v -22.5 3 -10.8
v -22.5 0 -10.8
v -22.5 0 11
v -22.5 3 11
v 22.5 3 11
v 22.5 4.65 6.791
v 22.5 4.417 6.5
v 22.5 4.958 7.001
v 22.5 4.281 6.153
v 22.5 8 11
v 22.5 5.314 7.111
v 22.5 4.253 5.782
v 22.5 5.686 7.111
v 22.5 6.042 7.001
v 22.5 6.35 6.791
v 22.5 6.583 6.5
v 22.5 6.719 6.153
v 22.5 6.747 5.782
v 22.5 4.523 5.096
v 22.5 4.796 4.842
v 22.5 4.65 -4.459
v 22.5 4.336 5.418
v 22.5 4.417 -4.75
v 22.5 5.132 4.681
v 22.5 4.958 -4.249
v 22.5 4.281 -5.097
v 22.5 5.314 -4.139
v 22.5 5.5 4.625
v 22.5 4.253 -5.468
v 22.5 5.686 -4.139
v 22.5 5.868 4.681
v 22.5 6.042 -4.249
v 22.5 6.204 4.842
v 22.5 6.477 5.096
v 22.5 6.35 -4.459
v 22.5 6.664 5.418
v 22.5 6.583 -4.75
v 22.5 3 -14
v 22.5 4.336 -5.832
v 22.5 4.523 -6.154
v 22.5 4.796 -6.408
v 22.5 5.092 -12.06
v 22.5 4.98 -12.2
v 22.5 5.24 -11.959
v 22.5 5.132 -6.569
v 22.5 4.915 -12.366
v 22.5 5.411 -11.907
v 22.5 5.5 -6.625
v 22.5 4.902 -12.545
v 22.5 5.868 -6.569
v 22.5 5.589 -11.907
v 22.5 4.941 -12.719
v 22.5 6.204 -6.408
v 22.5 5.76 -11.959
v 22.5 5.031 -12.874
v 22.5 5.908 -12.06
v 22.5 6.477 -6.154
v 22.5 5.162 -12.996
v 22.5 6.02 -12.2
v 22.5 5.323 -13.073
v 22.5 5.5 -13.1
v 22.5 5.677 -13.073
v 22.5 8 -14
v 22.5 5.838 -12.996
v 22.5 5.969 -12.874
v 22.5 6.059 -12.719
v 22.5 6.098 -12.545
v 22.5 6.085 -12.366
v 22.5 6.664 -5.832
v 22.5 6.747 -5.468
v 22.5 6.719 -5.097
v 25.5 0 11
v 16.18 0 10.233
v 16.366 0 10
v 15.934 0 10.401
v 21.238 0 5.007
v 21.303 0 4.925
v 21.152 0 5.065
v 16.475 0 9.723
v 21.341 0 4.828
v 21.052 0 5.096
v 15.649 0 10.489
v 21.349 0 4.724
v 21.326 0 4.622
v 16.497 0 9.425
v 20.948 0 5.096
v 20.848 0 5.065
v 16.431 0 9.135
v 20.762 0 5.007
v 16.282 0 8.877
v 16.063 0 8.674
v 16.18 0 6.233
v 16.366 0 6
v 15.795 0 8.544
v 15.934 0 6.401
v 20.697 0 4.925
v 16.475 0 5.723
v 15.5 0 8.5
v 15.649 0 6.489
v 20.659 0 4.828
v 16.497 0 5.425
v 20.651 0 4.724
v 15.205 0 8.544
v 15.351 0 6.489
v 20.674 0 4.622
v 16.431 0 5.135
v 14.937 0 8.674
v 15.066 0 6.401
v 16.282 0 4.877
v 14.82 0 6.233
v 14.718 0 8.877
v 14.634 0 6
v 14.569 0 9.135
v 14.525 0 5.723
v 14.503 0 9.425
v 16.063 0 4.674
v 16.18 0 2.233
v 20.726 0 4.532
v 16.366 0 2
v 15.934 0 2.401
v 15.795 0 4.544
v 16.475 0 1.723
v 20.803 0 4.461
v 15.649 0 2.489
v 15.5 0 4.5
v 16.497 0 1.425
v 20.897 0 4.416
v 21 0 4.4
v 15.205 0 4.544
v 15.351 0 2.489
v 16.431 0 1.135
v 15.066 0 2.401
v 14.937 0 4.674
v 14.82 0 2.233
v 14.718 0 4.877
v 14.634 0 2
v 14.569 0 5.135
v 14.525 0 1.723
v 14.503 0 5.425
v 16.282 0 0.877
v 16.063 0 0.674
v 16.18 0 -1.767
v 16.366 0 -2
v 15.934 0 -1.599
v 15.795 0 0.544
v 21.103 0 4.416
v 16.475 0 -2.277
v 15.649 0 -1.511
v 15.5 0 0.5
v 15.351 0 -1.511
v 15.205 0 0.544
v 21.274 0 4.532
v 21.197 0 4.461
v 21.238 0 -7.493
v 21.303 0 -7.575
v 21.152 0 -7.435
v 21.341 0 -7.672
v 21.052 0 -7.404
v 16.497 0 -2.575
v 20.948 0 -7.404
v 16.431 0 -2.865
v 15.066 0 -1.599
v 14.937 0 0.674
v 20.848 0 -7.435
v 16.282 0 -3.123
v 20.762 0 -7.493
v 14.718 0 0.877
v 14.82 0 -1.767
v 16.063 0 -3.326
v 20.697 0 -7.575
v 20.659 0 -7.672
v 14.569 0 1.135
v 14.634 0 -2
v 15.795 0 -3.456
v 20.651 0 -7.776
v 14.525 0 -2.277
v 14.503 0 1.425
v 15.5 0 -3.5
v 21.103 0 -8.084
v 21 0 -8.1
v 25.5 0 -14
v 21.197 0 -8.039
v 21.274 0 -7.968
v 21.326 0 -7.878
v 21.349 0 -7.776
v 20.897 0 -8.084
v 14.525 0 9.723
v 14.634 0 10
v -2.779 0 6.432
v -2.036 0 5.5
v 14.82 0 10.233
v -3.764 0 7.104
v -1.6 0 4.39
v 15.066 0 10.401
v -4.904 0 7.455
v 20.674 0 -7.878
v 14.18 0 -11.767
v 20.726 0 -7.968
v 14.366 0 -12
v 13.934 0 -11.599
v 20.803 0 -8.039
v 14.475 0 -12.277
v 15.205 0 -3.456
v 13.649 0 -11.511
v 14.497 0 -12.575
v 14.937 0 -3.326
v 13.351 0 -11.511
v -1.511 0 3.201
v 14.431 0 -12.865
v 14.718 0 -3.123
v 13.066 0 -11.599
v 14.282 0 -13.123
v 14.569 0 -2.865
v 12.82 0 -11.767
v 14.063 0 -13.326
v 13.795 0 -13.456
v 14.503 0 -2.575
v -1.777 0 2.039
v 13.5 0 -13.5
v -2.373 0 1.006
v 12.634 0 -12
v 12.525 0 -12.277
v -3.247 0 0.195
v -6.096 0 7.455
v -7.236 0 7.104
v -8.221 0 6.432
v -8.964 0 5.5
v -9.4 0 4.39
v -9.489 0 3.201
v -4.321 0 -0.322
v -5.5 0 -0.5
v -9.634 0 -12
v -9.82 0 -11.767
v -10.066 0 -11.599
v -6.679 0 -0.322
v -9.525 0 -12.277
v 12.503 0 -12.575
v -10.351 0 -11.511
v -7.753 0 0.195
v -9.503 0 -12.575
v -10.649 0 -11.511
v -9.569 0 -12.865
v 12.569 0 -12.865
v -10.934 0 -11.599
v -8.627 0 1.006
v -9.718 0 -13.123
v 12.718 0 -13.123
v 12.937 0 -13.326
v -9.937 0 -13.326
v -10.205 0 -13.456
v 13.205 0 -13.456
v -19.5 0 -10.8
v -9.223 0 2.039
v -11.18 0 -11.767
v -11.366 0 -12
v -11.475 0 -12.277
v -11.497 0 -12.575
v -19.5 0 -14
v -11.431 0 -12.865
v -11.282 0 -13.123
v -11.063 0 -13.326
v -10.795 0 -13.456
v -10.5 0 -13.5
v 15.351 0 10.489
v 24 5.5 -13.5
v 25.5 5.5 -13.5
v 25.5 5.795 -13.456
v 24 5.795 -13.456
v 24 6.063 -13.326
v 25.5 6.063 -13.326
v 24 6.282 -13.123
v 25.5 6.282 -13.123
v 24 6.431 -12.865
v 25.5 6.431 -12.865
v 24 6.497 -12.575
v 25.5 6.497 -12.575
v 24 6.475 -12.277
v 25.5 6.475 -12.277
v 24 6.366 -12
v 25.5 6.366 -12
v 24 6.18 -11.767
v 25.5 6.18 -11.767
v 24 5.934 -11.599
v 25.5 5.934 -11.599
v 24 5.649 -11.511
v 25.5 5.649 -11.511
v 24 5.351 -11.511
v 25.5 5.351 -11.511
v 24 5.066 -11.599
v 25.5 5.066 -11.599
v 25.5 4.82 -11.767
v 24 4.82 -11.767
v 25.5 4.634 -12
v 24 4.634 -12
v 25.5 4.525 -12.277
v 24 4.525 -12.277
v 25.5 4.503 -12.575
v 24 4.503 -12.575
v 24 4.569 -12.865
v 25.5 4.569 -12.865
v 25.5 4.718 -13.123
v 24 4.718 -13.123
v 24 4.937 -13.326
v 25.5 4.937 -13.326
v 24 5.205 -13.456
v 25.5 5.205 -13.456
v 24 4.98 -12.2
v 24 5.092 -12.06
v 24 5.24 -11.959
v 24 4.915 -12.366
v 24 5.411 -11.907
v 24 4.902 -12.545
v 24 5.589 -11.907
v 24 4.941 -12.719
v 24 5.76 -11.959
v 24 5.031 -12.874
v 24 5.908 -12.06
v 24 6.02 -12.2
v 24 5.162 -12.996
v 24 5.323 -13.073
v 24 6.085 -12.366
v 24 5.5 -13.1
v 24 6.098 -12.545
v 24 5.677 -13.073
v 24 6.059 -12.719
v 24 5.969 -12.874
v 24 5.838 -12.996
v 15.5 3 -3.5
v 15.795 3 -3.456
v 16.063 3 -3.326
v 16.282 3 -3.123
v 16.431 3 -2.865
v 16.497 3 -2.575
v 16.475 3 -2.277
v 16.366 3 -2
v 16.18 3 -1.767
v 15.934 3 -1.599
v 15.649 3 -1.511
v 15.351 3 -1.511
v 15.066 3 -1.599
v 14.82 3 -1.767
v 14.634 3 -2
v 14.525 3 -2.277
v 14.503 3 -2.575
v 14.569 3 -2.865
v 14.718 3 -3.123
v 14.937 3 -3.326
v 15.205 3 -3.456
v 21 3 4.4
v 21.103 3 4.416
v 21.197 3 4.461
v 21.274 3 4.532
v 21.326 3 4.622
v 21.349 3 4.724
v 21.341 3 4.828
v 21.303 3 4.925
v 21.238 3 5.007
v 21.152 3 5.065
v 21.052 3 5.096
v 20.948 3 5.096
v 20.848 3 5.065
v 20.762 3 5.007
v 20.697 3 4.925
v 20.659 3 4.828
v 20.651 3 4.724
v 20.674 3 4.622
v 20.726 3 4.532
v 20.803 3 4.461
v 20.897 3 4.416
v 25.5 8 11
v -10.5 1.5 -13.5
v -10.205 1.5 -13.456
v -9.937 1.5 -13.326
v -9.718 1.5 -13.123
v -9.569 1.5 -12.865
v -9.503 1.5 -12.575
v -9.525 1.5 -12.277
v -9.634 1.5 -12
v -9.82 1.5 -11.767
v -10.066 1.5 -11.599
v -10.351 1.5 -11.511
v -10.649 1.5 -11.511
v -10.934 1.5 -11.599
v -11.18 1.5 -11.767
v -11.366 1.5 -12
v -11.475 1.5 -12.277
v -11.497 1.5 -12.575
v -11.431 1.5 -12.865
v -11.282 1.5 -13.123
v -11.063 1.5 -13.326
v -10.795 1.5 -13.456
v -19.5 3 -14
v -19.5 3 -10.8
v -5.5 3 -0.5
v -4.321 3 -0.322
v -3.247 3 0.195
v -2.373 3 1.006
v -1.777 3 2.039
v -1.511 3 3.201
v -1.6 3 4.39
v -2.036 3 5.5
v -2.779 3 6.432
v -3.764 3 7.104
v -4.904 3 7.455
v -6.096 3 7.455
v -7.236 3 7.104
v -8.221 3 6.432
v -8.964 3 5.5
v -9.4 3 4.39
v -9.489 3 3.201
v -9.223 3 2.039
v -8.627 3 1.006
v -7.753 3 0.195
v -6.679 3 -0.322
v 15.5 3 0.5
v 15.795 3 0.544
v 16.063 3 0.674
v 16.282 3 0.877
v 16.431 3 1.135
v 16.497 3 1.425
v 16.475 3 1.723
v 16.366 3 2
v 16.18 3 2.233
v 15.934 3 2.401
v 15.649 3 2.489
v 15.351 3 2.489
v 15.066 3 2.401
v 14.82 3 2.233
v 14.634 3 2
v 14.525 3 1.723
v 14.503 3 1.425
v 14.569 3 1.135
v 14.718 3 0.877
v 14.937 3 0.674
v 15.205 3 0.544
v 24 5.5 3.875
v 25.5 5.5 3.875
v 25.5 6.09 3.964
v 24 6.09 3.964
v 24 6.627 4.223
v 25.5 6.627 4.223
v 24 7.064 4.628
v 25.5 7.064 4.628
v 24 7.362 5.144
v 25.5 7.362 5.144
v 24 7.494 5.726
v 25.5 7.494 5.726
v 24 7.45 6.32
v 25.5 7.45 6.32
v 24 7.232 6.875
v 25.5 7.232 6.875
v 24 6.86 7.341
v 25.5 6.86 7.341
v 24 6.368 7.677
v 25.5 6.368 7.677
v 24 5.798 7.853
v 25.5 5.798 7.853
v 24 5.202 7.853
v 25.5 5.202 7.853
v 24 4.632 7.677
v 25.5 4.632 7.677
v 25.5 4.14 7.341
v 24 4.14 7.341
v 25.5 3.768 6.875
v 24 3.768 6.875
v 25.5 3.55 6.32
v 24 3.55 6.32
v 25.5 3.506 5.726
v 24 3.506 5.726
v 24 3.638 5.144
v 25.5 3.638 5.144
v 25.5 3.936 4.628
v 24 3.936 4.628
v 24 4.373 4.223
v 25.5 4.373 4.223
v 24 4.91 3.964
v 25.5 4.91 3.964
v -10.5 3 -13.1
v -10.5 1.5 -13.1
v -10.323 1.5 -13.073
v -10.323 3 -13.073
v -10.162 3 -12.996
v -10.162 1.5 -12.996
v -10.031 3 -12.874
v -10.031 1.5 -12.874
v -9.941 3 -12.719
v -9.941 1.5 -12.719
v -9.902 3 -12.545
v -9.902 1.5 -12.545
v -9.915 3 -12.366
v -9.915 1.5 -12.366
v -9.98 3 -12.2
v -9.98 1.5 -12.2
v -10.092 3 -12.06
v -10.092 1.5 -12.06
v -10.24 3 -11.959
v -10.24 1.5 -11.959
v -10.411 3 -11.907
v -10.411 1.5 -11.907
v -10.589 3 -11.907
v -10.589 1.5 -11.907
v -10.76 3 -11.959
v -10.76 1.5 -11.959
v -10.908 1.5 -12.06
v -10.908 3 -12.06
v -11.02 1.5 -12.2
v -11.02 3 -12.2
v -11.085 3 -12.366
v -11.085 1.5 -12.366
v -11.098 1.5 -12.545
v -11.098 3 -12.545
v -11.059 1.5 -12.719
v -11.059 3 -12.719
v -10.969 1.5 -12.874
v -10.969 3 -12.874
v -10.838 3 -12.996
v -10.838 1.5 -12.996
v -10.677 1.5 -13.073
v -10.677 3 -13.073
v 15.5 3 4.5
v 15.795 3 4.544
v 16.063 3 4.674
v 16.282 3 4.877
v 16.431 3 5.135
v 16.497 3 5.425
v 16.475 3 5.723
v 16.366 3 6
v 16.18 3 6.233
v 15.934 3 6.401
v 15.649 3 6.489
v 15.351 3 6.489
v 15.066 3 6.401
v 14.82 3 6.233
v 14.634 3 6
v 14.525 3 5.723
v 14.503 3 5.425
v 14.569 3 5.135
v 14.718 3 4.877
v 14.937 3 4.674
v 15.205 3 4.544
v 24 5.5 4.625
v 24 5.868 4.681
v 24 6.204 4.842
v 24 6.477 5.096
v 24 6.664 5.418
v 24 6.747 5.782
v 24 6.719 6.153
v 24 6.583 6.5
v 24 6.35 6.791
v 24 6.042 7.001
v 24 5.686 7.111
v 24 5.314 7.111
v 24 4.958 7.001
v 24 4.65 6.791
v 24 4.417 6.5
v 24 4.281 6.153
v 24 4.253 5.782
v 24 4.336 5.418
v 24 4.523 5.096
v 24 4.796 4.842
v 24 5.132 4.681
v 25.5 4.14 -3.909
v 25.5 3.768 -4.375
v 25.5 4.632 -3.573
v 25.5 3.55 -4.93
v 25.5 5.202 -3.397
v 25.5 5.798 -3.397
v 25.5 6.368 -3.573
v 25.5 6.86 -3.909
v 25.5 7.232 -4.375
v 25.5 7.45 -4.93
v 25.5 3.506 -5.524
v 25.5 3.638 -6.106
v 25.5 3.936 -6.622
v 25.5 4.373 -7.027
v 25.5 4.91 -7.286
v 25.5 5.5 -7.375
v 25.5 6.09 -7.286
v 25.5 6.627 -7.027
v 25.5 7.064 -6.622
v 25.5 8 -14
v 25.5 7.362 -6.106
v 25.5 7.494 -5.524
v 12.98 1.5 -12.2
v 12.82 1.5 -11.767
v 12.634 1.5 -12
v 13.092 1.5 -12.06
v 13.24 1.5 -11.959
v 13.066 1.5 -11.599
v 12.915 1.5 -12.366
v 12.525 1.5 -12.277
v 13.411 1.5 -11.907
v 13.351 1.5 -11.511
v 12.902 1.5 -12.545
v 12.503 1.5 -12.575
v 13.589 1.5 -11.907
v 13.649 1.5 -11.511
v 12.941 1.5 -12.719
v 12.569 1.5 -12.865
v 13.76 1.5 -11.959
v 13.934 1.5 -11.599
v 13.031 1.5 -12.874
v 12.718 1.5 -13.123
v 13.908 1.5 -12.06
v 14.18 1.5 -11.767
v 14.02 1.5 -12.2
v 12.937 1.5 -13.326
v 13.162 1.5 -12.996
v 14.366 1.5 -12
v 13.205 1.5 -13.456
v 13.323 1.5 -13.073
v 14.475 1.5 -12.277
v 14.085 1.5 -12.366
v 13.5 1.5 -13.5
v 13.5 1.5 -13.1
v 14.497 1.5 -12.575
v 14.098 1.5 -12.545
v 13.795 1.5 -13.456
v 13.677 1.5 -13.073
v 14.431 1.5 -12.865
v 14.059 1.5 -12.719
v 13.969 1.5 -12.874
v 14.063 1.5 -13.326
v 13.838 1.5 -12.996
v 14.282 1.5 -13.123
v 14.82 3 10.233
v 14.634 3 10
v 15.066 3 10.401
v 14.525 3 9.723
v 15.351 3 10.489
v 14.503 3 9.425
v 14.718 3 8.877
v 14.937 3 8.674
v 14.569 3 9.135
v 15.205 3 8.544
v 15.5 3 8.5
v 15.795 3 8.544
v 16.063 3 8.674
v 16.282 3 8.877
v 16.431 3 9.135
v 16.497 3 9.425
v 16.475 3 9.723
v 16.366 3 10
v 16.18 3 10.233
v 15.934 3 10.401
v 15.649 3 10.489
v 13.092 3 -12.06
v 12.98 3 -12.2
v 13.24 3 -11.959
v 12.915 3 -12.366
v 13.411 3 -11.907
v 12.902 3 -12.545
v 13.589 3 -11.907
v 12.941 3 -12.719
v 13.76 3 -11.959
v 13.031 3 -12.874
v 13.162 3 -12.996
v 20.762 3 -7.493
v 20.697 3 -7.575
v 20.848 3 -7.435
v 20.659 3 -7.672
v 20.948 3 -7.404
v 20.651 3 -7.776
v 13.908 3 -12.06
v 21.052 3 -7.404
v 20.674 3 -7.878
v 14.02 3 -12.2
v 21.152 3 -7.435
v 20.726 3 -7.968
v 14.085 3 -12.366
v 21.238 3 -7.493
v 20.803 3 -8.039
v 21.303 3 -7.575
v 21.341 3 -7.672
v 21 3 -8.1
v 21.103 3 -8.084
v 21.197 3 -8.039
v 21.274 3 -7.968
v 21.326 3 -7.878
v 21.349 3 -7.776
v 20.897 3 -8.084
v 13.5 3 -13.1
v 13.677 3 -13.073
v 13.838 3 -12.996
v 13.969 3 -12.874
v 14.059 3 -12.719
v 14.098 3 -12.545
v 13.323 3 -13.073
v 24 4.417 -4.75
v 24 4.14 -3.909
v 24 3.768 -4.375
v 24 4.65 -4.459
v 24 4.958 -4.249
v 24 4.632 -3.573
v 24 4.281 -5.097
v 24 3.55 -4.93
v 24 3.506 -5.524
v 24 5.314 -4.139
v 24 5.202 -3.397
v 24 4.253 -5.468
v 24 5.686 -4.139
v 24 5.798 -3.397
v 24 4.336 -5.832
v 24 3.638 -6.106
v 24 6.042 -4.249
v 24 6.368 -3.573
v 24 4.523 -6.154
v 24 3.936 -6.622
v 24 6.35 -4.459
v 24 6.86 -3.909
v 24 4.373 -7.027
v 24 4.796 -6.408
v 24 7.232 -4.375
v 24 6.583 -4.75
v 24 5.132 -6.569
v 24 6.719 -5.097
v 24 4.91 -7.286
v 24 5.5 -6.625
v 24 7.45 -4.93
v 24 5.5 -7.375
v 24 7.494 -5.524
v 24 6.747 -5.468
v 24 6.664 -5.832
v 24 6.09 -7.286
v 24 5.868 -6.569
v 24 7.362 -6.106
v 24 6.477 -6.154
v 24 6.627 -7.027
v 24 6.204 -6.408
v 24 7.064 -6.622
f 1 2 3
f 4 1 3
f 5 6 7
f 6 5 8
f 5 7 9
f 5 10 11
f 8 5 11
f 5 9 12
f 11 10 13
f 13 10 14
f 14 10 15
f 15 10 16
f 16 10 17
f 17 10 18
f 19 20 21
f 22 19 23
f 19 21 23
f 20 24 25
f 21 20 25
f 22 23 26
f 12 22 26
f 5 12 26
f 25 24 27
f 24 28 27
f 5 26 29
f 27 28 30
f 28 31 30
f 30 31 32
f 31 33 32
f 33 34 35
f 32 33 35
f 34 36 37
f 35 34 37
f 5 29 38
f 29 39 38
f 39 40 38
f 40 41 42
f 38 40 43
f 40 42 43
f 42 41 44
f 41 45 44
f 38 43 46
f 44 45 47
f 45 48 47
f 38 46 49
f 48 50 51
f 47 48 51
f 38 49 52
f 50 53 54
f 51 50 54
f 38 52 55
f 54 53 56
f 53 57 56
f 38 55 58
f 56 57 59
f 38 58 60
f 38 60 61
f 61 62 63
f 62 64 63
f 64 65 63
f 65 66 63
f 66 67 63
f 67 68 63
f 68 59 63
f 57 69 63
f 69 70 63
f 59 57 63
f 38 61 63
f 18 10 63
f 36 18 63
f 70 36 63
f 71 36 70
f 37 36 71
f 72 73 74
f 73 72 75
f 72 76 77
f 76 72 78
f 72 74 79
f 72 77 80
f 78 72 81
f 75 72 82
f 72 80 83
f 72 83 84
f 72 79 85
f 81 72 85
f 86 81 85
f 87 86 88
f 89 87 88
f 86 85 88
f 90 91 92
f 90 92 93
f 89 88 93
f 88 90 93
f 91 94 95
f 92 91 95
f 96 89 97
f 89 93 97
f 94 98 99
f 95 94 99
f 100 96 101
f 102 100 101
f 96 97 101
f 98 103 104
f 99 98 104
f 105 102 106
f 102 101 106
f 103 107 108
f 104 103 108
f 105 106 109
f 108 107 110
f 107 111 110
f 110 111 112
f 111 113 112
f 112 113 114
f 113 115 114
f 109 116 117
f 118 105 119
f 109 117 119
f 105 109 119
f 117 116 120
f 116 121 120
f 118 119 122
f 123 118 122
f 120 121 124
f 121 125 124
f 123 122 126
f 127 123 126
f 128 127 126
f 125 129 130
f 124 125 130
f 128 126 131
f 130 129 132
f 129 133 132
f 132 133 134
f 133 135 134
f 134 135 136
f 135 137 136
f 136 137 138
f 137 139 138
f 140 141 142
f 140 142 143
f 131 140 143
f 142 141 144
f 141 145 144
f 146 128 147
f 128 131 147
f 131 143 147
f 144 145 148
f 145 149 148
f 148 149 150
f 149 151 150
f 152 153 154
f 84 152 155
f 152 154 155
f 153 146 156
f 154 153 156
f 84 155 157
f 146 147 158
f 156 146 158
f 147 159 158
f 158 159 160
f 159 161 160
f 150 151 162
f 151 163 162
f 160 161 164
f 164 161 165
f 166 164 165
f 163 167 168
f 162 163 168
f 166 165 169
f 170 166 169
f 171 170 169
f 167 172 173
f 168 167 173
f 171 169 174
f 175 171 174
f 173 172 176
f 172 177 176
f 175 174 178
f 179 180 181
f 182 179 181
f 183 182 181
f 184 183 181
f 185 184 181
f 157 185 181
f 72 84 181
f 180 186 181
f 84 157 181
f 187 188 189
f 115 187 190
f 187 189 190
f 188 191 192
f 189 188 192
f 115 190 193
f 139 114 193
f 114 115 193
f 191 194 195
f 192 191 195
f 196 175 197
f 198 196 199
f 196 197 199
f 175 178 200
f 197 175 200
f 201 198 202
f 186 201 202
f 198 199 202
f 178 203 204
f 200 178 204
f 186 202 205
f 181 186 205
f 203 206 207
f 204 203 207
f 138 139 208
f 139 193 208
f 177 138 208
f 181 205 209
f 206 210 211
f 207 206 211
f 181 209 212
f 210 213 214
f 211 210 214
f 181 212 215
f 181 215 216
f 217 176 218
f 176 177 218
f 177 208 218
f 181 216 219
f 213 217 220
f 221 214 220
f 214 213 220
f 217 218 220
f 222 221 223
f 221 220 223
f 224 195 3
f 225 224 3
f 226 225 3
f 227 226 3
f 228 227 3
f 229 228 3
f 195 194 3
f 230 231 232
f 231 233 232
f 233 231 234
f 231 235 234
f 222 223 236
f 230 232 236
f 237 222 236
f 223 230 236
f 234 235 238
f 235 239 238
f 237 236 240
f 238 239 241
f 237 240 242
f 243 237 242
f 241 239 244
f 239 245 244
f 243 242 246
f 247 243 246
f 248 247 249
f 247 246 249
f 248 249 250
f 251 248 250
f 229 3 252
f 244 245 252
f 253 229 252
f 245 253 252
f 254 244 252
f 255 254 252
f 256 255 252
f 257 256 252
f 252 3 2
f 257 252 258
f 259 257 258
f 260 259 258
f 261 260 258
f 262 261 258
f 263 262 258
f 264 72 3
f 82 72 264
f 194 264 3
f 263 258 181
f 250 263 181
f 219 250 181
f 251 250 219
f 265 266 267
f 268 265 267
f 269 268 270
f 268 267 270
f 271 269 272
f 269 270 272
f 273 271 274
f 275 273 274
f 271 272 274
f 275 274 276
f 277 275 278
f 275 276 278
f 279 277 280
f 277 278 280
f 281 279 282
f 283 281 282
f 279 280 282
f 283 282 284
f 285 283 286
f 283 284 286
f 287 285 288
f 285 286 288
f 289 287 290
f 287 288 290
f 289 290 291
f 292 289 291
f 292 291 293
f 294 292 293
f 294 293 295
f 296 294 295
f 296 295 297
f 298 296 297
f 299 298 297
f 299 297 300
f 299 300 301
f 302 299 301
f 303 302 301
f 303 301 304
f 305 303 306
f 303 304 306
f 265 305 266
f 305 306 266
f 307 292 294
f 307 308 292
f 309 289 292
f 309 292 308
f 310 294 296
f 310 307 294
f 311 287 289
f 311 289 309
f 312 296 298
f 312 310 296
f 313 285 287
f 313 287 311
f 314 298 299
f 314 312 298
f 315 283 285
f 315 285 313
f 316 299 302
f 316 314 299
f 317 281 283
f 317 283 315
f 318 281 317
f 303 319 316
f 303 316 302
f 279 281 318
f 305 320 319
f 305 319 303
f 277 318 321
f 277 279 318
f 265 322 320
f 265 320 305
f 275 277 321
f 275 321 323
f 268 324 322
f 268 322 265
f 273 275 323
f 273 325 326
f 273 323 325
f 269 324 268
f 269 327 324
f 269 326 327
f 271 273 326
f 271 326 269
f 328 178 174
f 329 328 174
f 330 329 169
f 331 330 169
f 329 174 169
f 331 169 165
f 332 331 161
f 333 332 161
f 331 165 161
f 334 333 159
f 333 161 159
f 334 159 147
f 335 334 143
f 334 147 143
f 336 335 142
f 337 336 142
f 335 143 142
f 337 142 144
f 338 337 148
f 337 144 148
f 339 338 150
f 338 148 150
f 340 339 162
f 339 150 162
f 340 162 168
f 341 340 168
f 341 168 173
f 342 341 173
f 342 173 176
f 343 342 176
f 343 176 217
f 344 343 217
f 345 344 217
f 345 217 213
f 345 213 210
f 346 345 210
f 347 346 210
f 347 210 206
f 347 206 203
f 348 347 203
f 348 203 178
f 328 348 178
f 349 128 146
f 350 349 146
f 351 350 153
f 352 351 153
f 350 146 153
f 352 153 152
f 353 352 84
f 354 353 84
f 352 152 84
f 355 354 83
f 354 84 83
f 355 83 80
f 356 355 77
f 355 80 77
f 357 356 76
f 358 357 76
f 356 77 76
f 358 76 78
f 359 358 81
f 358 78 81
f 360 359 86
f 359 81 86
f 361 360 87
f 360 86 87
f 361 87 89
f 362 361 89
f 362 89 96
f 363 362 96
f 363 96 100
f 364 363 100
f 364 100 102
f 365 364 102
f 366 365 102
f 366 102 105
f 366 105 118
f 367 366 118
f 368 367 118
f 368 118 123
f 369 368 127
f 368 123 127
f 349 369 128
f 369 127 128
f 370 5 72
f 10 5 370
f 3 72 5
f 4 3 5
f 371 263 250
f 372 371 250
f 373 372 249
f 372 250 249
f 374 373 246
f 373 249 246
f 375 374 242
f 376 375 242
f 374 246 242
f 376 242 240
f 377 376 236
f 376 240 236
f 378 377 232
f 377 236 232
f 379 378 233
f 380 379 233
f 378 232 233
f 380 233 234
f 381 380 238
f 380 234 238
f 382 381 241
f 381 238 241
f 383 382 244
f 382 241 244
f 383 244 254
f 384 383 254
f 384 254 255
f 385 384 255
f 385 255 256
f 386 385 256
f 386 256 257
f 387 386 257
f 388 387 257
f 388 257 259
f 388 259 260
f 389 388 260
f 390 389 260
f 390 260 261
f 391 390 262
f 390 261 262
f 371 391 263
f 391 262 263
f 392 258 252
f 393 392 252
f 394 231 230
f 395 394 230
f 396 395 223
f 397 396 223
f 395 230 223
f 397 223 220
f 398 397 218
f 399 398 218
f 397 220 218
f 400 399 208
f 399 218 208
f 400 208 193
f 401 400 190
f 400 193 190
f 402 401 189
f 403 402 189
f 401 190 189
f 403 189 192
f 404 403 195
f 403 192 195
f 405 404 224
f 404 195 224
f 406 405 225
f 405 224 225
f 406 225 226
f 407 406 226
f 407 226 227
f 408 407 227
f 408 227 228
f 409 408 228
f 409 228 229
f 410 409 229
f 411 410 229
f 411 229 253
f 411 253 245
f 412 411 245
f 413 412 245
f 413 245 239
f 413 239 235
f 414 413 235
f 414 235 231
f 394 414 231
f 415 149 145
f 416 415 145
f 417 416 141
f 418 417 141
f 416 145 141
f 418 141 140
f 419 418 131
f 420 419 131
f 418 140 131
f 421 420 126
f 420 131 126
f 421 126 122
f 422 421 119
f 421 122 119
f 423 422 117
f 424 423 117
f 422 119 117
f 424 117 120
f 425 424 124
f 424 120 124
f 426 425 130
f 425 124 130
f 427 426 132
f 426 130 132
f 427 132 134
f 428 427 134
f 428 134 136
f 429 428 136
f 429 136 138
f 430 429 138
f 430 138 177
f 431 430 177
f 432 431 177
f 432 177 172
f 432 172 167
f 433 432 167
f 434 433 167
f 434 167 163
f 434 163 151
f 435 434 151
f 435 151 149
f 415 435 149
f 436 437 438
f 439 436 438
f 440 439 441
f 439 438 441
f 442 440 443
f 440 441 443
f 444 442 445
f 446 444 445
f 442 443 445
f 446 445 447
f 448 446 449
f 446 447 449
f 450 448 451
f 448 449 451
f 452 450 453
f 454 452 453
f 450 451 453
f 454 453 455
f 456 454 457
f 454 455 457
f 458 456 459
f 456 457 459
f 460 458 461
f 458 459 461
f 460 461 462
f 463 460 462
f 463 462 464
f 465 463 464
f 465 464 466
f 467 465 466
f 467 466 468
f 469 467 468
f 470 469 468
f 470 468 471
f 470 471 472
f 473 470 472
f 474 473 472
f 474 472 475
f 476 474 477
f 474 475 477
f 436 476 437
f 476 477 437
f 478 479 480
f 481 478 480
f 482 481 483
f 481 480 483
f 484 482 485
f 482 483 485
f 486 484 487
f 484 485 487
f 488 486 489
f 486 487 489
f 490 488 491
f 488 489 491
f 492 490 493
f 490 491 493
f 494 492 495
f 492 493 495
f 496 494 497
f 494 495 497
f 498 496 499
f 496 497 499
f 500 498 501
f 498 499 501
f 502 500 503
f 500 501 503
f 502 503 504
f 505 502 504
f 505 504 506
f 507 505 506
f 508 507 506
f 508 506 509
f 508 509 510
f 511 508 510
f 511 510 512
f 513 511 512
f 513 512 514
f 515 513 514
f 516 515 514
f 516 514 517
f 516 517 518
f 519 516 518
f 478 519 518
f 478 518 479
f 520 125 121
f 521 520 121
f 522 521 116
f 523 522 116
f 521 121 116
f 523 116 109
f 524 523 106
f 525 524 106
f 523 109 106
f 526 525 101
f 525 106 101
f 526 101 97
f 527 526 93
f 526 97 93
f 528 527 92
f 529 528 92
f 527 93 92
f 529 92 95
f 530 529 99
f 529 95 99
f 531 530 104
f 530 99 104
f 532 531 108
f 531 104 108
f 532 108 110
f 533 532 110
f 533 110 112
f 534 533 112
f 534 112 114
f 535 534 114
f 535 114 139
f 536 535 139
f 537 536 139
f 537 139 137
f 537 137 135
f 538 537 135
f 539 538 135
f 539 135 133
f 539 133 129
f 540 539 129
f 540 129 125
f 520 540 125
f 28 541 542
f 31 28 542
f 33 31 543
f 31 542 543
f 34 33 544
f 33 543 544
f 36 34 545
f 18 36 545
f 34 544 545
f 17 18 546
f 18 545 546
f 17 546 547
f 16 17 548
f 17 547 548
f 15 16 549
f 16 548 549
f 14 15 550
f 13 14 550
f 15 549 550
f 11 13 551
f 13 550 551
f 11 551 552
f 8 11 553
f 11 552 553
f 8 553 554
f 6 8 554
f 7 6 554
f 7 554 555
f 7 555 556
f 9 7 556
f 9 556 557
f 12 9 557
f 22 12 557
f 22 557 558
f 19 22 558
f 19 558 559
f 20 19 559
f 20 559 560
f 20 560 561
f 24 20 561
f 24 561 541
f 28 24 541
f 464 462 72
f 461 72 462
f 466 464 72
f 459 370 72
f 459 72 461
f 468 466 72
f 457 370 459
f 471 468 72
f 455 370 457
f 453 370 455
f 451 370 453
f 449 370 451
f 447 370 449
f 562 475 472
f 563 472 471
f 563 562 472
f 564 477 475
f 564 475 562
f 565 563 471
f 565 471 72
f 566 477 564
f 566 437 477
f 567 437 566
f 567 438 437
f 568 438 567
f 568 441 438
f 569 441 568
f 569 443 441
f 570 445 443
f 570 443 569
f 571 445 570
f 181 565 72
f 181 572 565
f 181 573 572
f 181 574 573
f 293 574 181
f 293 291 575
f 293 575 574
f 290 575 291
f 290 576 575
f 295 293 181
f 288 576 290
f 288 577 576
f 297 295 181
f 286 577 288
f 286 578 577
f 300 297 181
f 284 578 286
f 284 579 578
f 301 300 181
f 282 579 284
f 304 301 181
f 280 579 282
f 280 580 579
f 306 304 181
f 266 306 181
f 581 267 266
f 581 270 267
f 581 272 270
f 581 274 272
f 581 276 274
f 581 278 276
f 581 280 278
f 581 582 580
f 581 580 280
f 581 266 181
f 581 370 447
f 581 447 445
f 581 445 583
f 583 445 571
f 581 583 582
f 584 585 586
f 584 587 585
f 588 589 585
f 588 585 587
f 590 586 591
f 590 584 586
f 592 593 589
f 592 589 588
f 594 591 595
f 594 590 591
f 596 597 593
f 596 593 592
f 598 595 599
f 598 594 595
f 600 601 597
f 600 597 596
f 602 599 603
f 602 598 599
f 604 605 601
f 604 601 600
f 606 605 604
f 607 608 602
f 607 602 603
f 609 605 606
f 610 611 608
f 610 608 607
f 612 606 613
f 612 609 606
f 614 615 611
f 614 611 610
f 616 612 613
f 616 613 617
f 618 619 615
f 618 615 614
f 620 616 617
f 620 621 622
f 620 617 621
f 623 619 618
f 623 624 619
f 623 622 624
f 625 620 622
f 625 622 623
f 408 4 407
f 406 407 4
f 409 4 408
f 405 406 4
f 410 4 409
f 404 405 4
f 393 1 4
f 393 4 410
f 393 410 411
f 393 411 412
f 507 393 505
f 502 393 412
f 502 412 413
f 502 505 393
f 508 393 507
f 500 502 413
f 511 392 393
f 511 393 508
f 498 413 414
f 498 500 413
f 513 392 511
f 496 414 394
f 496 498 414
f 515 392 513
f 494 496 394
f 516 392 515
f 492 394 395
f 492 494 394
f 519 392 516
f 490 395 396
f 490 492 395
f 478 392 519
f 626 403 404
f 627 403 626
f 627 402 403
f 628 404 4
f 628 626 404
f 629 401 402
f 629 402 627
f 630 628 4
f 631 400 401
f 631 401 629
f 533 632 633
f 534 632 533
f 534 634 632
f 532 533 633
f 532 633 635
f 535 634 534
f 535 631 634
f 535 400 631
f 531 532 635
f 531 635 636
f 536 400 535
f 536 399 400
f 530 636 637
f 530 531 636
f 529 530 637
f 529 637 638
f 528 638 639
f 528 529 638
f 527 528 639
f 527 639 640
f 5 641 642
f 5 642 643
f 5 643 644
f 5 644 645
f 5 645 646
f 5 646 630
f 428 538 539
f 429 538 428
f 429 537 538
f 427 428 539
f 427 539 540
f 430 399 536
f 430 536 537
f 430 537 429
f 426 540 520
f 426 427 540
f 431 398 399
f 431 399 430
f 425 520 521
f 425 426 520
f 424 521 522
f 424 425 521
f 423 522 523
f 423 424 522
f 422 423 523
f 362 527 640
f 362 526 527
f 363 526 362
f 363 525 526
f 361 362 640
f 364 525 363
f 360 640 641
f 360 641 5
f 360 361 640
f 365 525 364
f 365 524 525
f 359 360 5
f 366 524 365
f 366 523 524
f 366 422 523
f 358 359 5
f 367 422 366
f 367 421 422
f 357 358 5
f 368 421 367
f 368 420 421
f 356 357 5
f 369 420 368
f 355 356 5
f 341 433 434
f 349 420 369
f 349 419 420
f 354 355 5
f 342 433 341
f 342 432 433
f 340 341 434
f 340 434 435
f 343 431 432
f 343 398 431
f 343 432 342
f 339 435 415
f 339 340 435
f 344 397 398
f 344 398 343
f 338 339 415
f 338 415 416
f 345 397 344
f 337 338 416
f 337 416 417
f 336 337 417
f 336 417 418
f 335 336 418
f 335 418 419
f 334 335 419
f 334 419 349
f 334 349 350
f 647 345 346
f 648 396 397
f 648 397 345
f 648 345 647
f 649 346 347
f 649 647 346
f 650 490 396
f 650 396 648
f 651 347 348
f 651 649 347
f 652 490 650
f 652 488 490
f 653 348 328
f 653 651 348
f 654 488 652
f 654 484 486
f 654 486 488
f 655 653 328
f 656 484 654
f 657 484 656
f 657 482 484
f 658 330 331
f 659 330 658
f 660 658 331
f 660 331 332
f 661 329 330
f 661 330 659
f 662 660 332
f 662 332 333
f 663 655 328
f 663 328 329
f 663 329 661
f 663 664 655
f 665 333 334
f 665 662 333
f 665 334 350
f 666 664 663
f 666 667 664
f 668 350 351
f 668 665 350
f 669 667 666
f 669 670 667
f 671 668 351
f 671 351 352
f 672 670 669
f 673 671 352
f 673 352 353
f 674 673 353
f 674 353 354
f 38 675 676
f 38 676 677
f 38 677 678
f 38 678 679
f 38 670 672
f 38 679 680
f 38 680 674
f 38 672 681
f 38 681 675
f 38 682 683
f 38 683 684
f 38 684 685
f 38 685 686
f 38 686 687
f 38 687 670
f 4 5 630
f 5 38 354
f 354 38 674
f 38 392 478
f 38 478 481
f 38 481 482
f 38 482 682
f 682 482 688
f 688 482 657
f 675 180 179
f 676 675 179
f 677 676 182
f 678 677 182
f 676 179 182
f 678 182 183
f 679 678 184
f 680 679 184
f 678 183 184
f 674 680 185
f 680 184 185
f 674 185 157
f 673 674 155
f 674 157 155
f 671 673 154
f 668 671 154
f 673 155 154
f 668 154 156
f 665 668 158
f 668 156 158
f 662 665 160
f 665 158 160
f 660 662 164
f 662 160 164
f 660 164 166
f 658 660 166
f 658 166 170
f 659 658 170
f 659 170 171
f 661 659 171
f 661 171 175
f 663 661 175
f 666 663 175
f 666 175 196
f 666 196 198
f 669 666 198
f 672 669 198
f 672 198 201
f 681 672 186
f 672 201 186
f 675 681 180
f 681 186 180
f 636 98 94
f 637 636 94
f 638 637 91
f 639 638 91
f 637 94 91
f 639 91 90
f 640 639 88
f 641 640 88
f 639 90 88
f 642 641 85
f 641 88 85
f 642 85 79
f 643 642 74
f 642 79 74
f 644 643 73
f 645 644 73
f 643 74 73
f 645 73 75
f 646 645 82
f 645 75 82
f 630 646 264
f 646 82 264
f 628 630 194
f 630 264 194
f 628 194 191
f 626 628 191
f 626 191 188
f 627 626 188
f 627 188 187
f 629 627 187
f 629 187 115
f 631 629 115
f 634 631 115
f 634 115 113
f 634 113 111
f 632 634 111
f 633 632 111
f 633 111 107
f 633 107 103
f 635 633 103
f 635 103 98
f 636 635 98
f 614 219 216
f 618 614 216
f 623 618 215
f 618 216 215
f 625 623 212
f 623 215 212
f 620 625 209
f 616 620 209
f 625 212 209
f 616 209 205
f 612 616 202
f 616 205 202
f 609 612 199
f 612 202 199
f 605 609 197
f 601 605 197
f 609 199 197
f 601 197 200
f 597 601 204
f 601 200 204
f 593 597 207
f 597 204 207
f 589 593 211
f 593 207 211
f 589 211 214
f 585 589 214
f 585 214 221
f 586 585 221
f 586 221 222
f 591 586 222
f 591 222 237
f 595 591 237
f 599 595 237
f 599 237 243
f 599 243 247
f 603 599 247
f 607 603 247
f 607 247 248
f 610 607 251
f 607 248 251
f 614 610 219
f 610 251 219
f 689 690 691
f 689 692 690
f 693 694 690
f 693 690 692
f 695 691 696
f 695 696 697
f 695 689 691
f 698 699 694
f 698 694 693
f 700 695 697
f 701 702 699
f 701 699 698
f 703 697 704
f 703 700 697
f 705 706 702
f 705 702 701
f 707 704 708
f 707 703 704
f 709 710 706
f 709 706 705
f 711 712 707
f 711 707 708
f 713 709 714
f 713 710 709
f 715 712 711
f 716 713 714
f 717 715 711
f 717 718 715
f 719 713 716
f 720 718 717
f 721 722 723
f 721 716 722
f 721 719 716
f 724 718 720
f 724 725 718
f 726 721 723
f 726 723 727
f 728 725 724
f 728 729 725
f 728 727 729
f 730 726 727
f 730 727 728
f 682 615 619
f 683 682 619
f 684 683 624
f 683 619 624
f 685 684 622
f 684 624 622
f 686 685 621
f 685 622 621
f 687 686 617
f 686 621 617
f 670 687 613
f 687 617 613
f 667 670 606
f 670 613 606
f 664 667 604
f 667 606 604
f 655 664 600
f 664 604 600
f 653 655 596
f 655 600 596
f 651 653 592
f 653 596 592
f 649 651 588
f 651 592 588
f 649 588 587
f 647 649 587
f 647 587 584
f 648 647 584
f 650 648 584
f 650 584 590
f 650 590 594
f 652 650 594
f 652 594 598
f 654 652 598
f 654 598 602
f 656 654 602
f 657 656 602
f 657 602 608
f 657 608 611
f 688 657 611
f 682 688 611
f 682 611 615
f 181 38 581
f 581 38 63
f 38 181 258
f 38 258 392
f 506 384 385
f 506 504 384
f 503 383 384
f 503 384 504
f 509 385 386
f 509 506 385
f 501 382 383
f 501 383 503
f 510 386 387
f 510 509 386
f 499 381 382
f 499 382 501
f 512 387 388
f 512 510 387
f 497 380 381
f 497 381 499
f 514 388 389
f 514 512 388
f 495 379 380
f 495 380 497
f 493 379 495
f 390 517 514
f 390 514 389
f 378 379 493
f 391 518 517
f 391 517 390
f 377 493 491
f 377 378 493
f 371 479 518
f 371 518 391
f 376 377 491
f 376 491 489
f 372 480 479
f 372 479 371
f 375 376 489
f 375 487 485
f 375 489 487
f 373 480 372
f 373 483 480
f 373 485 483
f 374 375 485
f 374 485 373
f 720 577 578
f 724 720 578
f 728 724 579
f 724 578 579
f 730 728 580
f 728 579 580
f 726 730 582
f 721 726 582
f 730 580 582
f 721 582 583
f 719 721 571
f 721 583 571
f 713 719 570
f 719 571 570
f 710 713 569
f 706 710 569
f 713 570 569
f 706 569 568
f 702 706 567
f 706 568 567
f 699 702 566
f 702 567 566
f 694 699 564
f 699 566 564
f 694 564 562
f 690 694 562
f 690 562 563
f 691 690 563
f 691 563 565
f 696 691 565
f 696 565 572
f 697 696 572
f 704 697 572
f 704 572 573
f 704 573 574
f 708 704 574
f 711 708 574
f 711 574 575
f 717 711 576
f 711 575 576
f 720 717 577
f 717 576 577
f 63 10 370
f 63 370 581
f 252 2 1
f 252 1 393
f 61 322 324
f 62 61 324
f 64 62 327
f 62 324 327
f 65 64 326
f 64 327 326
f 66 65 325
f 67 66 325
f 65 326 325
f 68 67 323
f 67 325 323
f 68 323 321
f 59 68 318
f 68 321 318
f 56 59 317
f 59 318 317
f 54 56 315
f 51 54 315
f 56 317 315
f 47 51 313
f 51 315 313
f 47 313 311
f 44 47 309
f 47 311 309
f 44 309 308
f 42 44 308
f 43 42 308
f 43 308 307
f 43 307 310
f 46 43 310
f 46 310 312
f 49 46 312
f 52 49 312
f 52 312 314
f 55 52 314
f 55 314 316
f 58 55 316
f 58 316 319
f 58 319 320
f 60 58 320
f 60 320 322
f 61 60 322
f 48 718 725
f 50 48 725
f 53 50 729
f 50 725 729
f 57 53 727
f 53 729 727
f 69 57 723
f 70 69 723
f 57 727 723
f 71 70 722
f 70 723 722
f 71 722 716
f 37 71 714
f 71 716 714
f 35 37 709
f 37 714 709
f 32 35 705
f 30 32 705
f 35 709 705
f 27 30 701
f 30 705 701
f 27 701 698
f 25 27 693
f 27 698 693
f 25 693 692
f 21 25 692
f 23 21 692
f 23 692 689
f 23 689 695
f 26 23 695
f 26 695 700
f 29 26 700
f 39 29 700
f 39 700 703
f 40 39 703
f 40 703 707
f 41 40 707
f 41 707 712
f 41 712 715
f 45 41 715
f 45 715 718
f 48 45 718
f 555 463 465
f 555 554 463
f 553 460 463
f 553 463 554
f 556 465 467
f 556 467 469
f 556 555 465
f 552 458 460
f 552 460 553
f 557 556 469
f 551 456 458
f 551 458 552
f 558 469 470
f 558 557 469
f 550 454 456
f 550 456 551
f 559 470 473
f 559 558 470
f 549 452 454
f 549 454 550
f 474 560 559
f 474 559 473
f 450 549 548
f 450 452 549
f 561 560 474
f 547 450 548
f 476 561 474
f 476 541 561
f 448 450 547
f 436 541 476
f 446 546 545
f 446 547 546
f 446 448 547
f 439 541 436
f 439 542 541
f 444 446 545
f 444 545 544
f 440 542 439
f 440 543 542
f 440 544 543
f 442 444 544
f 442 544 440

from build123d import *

# Parameters (mm, degrees)
SKETCH_1_W          = 42
SKETCH_1_H          = 3
EXTRUDE_1_DEPTH     = 3
SKETCH_2_W          = 25
SKETCH_2_H          = 8
EXTRUDE_2_DEPTH     = 3
SKETCH_3_R          = 1.25
CUT_EXTRUDE_1_DEPTH = 51.635955605
SKETCH_3_3_R        = 2
CUT_EXTRUDE_2_DEPTH = 1.5
SKETCH_4_R          = 0.6
CUT_EXTRUDE_3_DEPTH = 51.635955605
SKETCH_4_3_R        = 1
CUT_EXTRUDE_4_DEPTH = 1.5
SKETCH_5_W          = 3
SKETCH_5_H          = 0.2
CUT_EXTRUDE_5_DEPTH = 31.170349683
SKETCH_6_R          = 0.6
CUT_EXTRUDE_6_DEPTH = 31.170349683
SKETCH_6_3_R        = 1
CUT_EXTRUDE_7_DEPTH = 1.5
SKETCH_7_R          = 0.35
CUT_EXTRUDE_8_DEPTH = 3
SKETCH_8_R          = 4
SKETCH_8_R_2        = 1
CUT_EXTRUDE_9_DEPTH = 31.170349683


with BuildPart() as part:
    # 草图1 → 凸台-拉伸1 (new body)
    with BuildSketch(Plane(origin=(0, 0, 0), x_dir=(1, 0, 0), z_dir=(0, 1, 0))):
        Polygon((-22.5, 11), (-22.5, -11), (22.5, -11), (22.5, 11), (-19.5, 11), align=None)
        with Locations((1.5, 12.5)):
            Rectangle(SKETCH_1_W, SKETCH_1_H)
    extrude(amount=EXTRUDE_1_DEPTH)

    # 草图2 → 凸台-拉伸2 (add)
    with BuildSketch(Plane(origin=(22.5, 0, 0), x_dir=(0, 0, -1), z_dir=(1, 0, 0))):
        with Locations((1.5, 4)):
            Rectangle(SKETCH_2_W, SKETCH_2_H)
    extrude(amount=EXTRUDE_2_DEPTH)

    # 草图3 → 切除-拉伸1 (cut, through all)
    with BuildSketch(Plane(origin=(25.5, 0, 0), x_dir=(0, 0, -1), z_dir=(1, 0, 0))):
        with Locations((5.375, 5.500000041)):
            Circle(SKETCH_3_R)
        with Locations((-5.875, 5.500000041)):
            Circle(SKETCH_3_R)
    extrude(amount=-CUT_EXTRUDE_1_DEPTH, mode=Mode.SUBTRACT)

    # 草图3<3> → 切除-拉伸2 (cut)
    with BuildSketch(Plane(origin=(25.5, 0, 0), x_dir=(0, 0, -1), z_dir=(1, 0, 0))):
        with Locations((5.375, 5.500000041)):
            Circle(SKETCH_3_3_R)
        with Locations((-5.875, 5.500000041)):
            Circle(SKETCH_3_3_R)
    extrude(amount=-CUT_EXTRUDE_2_DEPTH, mode=Mode.SUBTRACT)

    # 草图4 → 切除-拉伸3 (cut, through all)
    with BuildSketch(Plane(origin=(25.5, 0, 0), x_dir=(0, 0, -1), z_dir=(1, 0, 0))):
        with Locations((12.5, 5.5)):
            Circle(SKETCH_4_R)
    extrude(amount=-CUT_EXTRUDE_3_DEPTH, mode=Mode.SUBTRACT)

    # 草图4<3> → 切除-拉伸4 (cut)
    with BuildSketch(Plane(origin=(25.5, 0, 0), x_dir=(0, 0, -1), z_dir=(1, 0, 0))):
        with Locations((12.5, 5.5)):
            Circle(SKETCH_4_3_R)
    extrude(amount=-CUT_EXTRUDE_4_DEPTH, mode=Mode.SUBTRACT)

    # 草图5 → 切除-拉伸5 (cut, through all)
    with BuildSketch(Plane.XZ):
        with Locations((-21, -10.9)):
            Rectangle(SKETCH_5_W, SKETCH_5_H)
    extrude(amount=-CUT_EXTRUDE_5_DEPTH, mode=Mode.SUBTRACT)

    # 草图6 → 切除-拉伸6 (cut, through all)
    with BuildSketch(Plane.XZ):
        with Locations((-10.5, -12.5)):
            Circle(SKETCH_6_R)
        with Locations((13.5, -12.5)):
            Circle(SKETCH_6_R)
    extrude(amount=-CUT_EXTRUDE_6_DEPTH, mode=Mode.SUBTRACT)

    # 草图6<3> → 切除-拉伸7 (cut)
    with BuildSketch(Plane.XZ):
        with Locations((-10.5, -12.5)):
            Circle(SKETCH_6_3_R)
        with Locations((13.5, -12.5)):
            Circle(SKETCH_6_3_R)
    extrude(amount=-CUT_EXTRUDE_7_DEPTH, mode=Mode.SUBTRACT)

    # 草图7 → 切除-拉伸8 (cut)
    with BuildSketch(Plane.XZ):
        with Locations((21, 4.75)):
            Circle(SKETCH_7_R)
        with Locations((21, -7.75)):
            Circle(SKETCH_7_R)
    extrude(amount=-CUT_EXTRUDE_8_DEPTH, mode=Mode.SUBTRACT)

    # 草图8 → 切除-拉伸9 (cut, through all)
    with BuildSketch(Plane.XZ):
        with Locations((-5.5, 3.5)):
            Circle(SKETCH_8_R)
        with Locations((15.5, 9.5)):
            Circle(SKETCH_8_R_2)
        with Locations((15.5, 5.5)):
            Circle(SKETCH_8_R_2)
        with Locations((15.5, 1.5)):
            Circle(SKETCH_8_R_2)
        with Locations((15.5, -2.5)):
            Circle(SKETCH_8_R_2)
    extrude(amount=-CUT_EXTRUDE_9_DEPTH, mode=Mode.SUBTRACT)


solid = part.part
